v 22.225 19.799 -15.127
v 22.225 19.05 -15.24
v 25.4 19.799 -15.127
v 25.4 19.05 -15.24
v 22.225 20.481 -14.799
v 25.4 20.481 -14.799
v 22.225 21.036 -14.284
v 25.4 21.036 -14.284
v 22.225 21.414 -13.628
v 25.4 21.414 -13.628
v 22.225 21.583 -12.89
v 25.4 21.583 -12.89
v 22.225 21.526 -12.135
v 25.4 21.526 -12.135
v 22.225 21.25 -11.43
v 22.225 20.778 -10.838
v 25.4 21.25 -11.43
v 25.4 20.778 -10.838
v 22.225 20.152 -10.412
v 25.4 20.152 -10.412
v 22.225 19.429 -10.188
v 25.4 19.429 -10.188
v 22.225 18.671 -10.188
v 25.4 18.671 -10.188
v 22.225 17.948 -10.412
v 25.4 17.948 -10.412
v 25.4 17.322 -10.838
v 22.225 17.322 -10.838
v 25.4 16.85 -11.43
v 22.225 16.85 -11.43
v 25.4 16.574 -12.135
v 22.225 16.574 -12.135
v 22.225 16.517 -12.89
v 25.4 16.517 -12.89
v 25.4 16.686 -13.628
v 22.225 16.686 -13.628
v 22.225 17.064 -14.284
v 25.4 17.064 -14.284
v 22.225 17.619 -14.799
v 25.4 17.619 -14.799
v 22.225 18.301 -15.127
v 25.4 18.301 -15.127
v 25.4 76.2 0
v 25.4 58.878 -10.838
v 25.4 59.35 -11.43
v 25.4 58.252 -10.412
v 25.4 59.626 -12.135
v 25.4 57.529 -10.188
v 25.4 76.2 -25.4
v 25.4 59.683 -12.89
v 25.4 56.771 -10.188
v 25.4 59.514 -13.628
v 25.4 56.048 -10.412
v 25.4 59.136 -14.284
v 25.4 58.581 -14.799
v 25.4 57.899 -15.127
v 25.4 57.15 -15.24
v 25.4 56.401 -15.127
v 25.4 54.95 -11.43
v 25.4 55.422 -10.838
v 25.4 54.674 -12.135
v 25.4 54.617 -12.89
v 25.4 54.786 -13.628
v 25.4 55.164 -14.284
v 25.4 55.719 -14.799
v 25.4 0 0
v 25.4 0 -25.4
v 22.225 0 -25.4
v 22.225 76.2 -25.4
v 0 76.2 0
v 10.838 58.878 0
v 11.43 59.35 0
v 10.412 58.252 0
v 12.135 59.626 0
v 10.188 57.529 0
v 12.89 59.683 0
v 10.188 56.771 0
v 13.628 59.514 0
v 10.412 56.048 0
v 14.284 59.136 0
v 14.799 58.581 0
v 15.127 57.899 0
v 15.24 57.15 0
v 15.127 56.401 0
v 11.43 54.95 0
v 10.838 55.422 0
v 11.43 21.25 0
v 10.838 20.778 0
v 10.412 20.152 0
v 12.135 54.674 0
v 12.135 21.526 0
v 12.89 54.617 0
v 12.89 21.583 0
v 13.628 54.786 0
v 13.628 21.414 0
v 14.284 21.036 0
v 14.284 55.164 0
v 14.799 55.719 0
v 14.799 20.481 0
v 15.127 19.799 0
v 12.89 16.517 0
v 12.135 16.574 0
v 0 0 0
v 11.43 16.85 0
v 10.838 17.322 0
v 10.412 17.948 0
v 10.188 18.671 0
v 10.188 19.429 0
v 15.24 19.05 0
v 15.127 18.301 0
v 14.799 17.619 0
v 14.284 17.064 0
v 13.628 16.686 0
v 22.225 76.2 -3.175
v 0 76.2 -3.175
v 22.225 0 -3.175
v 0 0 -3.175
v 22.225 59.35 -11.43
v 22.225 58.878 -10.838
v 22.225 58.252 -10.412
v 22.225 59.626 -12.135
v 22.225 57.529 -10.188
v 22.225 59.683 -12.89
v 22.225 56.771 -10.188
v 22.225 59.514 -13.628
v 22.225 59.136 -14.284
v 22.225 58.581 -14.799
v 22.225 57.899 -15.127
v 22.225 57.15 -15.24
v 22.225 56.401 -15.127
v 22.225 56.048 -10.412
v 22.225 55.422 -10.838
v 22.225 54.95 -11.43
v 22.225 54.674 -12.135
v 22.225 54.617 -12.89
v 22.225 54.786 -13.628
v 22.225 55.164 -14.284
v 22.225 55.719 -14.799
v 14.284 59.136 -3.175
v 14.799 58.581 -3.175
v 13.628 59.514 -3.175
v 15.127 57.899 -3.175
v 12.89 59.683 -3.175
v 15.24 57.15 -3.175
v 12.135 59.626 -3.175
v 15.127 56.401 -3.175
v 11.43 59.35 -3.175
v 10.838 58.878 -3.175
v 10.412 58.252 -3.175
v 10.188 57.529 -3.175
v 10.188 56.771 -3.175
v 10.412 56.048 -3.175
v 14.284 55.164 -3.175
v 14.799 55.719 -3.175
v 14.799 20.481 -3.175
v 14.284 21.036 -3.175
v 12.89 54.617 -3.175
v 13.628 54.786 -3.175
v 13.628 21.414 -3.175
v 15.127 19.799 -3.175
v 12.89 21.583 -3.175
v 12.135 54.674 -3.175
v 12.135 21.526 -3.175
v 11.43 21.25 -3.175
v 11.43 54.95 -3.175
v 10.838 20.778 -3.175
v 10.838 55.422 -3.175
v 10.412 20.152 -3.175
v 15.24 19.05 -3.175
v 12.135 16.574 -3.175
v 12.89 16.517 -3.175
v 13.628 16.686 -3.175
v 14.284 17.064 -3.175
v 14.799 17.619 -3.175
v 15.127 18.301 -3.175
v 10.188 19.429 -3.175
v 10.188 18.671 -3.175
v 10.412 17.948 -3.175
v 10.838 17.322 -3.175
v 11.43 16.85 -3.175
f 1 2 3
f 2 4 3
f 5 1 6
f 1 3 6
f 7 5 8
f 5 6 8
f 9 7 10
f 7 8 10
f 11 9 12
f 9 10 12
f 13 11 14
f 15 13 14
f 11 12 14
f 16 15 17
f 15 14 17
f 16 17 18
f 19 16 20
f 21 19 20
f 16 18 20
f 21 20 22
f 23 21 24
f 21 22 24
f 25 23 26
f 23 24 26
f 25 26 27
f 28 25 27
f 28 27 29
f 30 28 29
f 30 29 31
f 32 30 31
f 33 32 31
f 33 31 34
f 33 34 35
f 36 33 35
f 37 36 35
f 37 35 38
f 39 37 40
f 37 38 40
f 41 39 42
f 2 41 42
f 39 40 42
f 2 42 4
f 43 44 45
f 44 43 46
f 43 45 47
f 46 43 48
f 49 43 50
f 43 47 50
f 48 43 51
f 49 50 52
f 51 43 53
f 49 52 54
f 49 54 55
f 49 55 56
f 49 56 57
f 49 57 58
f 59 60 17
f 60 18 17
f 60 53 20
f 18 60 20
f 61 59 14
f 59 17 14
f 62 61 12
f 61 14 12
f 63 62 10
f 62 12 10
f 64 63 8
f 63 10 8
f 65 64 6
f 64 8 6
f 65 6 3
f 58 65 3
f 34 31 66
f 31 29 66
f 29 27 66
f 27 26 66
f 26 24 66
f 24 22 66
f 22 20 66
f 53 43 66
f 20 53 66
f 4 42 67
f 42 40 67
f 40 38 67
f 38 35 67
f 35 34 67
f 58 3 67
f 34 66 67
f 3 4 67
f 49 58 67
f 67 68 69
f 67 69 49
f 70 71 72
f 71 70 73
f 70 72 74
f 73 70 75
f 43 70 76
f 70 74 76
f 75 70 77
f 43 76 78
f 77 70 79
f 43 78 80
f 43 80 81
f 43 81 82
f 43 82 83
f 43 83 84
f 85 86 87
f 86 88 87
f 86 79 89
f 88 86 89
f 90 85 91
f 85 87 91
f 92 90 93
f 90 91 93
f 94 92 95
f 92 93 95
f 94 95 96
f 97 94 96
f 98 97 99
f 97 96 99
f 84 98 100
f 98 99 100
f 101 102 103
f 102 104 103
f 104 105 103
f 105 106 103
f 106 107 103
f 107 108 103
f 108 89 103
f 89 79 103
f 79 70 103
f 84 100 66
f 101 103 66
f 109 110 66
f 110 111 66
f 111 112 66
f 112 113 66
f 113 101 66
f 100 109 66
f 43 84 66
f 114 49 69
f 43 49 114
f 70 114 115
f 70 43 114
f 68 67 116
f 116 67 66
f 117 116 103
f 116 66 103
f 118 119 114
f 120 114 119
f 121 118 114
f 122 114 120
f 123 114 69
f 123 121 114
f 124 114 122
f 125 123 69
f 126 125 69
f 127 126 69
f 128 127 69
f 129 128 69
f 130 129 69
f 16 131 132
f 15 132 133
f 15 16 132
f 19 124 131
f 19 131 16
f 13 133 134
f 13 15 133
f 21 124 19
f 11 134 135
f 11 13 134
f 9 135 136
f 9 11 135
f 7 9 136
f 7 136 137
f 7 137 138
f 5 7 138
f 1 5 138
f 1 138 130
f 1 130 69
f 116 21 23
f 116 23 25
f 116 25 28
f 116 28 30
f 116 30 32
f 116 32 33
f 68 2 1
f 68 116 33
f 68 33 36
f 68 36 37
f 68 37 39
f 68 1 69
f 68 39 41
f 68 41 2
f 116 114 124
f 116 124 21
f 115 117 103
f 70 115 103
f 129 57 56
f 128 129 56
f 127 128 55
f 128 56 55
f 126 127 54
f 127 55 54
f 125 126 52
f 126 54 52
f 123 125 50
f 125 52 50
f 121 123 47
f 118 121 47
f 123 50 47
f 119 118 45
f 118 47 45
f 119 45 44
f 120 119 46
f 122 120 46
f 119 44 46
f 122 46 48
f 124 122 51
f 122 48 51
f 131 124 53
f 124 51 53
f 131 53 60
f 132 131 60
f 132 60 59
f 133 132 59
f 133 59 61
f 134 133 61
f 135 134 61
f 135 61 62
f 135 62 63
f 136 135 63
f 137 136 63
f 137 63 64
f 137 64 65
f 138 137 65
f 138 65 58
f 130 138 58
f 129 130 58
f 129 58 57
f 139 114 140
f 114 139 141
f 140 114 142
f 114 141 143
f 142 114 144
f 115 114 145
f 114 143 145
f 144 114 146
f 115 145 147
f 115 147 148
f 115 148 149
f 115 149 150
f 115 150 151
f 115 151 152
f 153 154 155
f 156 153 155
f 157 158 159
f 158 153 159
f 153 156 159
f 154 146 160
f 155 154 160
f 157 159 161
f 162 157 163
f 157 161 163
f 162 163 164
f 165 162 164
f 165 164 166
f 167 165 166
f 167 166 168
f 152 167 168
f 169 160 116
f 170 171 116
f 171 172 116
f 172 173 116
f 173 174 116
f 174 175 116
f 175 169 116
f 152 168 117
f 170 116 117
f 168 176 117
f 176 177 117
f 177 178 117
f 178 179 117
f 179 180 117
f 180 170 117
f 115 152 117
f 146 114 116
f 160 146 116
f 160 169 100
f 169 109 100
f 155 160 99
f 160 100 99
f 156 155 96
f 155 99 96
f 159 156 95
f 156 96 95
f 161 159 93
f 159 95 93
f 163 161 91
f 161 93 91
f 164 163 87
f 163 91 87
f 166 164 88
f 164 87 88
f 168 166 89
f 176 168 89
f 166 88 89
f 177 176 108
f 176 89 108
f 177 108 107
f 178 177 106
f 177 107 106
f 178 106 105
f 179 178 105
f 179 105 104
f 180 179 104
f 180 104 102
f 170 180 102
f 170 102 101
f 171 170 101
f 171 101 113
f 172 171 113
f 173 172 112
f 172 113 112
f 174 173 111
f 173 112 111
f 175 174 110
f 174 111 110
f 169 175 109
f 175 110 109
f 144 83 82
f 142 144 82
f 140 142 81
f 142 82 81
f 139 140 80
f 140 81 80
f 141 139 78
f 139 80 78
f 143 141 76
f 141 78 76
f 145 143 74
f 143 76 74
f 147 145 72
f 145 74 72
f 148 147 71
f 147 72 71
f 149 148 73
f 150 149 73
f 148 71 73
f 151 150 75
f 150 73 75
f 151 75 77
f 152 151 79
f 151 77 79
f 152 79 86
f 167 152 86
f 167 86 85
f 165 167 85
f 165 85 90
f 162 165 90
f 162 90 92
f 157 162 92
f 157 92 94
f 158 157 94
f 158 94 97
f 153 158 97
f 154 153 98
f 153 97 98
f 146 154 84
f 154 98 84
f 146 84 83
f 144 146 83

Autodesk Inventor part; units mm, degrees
ref_plane "YZ Plane" through (0, 0, 0) normal (1, 0, 0) x (0, 1, 0)
ref_plane "XZ Plane" through (0, 0, 0) normal (0, 1, 0) x (-1, 0, 0)
ref_plane "XY Plane" through (0, 0, 0) normal (0, 0, 1) x (1, 0, 0)
sketch "Sketch1" plane through (0, 0, 0) normal (0, 1, 0) x (-1, 0, 0)
  line L0 (0, 0) -> (-25.4, 0)
  line L1 (-25.4, 0) -> (-25.4, -3.175)
  line L2 (-25.4, -3.175) -> (0, -3.175)
  line L3 (0, -3.175) -> (0, 0)
  line L4 (-25.4, 0) -> (-22.225, 0)
  line L5 (-22.225, 0) -> (-22.225, -25.4)
  line L6 (-22.225, -25.4) -> (-25.4, -25.4)
  line L7 (-25.4, -25.4) -> (-25.4, 0)
  dimension "d0" = 25.4
  dimension "d1" = 3.175
  dimension "d2" = 25.4
  dimension "d3" = 3.175
extrude "Extrusion1" add sketch "Sketch1" along normal blind 76.2
sketch "Sketch2" plane through (25.4, 0, 0) normal (1, 0, 0) x (0, 0, -1)
  line L0 (0, 0) -> (0, 76.2) projected
  line L1 (0, 76.2) -> (12.7, 76.2)
  line L2 (12.7, 76.2) -> (12.7, 57.15)
  line L3 (0, 0) -> (25.4, 0) projected
  line L4 (12.7, 0) -> (12.7, 19.05)
  circle A0 centre (12.7, 57.15) radius 2.54
  circle A1 centre (12.7, 19.05) radius 2.54
  dimension "d6" = 12.7
  dimension "d7" = 19.05
  dimension "d8" = 19.05
  dimension "d9" = 5.08
extrude "Extrusion2" cut sketch "Sketch2" against normal blind 25.4
sketch "Sketch3" plane through (0, 0, 0) normal (0, 0, 1) x (1, 0, 0)
  line L0 (0, 0) -> (0, 76.2) projected
  line L1 (0, 76.2) -> (12.7, 76.2)
  line L2 (0, 76.2) -> (25.4, 76.2) projected
  line L3 (12.7, 76.2) -> (12.7, 57.15)
  line L4 (12.7, 0) -> (12.7, 19.05)
  circle A0 centre (12.7, 57.15) radius 2.54
  circle A1 centre (12.7, 19.05) radius 2.54
  dimension "d12" = 19.05
  dimension "d13" = 19.05
  dimension "d14" = 5.08
extrude "Extrusion3" cut sketch "Sketch3" against normal blind 25.4
properties part number "L Bracket 3in" material "Aluminum 6061"
